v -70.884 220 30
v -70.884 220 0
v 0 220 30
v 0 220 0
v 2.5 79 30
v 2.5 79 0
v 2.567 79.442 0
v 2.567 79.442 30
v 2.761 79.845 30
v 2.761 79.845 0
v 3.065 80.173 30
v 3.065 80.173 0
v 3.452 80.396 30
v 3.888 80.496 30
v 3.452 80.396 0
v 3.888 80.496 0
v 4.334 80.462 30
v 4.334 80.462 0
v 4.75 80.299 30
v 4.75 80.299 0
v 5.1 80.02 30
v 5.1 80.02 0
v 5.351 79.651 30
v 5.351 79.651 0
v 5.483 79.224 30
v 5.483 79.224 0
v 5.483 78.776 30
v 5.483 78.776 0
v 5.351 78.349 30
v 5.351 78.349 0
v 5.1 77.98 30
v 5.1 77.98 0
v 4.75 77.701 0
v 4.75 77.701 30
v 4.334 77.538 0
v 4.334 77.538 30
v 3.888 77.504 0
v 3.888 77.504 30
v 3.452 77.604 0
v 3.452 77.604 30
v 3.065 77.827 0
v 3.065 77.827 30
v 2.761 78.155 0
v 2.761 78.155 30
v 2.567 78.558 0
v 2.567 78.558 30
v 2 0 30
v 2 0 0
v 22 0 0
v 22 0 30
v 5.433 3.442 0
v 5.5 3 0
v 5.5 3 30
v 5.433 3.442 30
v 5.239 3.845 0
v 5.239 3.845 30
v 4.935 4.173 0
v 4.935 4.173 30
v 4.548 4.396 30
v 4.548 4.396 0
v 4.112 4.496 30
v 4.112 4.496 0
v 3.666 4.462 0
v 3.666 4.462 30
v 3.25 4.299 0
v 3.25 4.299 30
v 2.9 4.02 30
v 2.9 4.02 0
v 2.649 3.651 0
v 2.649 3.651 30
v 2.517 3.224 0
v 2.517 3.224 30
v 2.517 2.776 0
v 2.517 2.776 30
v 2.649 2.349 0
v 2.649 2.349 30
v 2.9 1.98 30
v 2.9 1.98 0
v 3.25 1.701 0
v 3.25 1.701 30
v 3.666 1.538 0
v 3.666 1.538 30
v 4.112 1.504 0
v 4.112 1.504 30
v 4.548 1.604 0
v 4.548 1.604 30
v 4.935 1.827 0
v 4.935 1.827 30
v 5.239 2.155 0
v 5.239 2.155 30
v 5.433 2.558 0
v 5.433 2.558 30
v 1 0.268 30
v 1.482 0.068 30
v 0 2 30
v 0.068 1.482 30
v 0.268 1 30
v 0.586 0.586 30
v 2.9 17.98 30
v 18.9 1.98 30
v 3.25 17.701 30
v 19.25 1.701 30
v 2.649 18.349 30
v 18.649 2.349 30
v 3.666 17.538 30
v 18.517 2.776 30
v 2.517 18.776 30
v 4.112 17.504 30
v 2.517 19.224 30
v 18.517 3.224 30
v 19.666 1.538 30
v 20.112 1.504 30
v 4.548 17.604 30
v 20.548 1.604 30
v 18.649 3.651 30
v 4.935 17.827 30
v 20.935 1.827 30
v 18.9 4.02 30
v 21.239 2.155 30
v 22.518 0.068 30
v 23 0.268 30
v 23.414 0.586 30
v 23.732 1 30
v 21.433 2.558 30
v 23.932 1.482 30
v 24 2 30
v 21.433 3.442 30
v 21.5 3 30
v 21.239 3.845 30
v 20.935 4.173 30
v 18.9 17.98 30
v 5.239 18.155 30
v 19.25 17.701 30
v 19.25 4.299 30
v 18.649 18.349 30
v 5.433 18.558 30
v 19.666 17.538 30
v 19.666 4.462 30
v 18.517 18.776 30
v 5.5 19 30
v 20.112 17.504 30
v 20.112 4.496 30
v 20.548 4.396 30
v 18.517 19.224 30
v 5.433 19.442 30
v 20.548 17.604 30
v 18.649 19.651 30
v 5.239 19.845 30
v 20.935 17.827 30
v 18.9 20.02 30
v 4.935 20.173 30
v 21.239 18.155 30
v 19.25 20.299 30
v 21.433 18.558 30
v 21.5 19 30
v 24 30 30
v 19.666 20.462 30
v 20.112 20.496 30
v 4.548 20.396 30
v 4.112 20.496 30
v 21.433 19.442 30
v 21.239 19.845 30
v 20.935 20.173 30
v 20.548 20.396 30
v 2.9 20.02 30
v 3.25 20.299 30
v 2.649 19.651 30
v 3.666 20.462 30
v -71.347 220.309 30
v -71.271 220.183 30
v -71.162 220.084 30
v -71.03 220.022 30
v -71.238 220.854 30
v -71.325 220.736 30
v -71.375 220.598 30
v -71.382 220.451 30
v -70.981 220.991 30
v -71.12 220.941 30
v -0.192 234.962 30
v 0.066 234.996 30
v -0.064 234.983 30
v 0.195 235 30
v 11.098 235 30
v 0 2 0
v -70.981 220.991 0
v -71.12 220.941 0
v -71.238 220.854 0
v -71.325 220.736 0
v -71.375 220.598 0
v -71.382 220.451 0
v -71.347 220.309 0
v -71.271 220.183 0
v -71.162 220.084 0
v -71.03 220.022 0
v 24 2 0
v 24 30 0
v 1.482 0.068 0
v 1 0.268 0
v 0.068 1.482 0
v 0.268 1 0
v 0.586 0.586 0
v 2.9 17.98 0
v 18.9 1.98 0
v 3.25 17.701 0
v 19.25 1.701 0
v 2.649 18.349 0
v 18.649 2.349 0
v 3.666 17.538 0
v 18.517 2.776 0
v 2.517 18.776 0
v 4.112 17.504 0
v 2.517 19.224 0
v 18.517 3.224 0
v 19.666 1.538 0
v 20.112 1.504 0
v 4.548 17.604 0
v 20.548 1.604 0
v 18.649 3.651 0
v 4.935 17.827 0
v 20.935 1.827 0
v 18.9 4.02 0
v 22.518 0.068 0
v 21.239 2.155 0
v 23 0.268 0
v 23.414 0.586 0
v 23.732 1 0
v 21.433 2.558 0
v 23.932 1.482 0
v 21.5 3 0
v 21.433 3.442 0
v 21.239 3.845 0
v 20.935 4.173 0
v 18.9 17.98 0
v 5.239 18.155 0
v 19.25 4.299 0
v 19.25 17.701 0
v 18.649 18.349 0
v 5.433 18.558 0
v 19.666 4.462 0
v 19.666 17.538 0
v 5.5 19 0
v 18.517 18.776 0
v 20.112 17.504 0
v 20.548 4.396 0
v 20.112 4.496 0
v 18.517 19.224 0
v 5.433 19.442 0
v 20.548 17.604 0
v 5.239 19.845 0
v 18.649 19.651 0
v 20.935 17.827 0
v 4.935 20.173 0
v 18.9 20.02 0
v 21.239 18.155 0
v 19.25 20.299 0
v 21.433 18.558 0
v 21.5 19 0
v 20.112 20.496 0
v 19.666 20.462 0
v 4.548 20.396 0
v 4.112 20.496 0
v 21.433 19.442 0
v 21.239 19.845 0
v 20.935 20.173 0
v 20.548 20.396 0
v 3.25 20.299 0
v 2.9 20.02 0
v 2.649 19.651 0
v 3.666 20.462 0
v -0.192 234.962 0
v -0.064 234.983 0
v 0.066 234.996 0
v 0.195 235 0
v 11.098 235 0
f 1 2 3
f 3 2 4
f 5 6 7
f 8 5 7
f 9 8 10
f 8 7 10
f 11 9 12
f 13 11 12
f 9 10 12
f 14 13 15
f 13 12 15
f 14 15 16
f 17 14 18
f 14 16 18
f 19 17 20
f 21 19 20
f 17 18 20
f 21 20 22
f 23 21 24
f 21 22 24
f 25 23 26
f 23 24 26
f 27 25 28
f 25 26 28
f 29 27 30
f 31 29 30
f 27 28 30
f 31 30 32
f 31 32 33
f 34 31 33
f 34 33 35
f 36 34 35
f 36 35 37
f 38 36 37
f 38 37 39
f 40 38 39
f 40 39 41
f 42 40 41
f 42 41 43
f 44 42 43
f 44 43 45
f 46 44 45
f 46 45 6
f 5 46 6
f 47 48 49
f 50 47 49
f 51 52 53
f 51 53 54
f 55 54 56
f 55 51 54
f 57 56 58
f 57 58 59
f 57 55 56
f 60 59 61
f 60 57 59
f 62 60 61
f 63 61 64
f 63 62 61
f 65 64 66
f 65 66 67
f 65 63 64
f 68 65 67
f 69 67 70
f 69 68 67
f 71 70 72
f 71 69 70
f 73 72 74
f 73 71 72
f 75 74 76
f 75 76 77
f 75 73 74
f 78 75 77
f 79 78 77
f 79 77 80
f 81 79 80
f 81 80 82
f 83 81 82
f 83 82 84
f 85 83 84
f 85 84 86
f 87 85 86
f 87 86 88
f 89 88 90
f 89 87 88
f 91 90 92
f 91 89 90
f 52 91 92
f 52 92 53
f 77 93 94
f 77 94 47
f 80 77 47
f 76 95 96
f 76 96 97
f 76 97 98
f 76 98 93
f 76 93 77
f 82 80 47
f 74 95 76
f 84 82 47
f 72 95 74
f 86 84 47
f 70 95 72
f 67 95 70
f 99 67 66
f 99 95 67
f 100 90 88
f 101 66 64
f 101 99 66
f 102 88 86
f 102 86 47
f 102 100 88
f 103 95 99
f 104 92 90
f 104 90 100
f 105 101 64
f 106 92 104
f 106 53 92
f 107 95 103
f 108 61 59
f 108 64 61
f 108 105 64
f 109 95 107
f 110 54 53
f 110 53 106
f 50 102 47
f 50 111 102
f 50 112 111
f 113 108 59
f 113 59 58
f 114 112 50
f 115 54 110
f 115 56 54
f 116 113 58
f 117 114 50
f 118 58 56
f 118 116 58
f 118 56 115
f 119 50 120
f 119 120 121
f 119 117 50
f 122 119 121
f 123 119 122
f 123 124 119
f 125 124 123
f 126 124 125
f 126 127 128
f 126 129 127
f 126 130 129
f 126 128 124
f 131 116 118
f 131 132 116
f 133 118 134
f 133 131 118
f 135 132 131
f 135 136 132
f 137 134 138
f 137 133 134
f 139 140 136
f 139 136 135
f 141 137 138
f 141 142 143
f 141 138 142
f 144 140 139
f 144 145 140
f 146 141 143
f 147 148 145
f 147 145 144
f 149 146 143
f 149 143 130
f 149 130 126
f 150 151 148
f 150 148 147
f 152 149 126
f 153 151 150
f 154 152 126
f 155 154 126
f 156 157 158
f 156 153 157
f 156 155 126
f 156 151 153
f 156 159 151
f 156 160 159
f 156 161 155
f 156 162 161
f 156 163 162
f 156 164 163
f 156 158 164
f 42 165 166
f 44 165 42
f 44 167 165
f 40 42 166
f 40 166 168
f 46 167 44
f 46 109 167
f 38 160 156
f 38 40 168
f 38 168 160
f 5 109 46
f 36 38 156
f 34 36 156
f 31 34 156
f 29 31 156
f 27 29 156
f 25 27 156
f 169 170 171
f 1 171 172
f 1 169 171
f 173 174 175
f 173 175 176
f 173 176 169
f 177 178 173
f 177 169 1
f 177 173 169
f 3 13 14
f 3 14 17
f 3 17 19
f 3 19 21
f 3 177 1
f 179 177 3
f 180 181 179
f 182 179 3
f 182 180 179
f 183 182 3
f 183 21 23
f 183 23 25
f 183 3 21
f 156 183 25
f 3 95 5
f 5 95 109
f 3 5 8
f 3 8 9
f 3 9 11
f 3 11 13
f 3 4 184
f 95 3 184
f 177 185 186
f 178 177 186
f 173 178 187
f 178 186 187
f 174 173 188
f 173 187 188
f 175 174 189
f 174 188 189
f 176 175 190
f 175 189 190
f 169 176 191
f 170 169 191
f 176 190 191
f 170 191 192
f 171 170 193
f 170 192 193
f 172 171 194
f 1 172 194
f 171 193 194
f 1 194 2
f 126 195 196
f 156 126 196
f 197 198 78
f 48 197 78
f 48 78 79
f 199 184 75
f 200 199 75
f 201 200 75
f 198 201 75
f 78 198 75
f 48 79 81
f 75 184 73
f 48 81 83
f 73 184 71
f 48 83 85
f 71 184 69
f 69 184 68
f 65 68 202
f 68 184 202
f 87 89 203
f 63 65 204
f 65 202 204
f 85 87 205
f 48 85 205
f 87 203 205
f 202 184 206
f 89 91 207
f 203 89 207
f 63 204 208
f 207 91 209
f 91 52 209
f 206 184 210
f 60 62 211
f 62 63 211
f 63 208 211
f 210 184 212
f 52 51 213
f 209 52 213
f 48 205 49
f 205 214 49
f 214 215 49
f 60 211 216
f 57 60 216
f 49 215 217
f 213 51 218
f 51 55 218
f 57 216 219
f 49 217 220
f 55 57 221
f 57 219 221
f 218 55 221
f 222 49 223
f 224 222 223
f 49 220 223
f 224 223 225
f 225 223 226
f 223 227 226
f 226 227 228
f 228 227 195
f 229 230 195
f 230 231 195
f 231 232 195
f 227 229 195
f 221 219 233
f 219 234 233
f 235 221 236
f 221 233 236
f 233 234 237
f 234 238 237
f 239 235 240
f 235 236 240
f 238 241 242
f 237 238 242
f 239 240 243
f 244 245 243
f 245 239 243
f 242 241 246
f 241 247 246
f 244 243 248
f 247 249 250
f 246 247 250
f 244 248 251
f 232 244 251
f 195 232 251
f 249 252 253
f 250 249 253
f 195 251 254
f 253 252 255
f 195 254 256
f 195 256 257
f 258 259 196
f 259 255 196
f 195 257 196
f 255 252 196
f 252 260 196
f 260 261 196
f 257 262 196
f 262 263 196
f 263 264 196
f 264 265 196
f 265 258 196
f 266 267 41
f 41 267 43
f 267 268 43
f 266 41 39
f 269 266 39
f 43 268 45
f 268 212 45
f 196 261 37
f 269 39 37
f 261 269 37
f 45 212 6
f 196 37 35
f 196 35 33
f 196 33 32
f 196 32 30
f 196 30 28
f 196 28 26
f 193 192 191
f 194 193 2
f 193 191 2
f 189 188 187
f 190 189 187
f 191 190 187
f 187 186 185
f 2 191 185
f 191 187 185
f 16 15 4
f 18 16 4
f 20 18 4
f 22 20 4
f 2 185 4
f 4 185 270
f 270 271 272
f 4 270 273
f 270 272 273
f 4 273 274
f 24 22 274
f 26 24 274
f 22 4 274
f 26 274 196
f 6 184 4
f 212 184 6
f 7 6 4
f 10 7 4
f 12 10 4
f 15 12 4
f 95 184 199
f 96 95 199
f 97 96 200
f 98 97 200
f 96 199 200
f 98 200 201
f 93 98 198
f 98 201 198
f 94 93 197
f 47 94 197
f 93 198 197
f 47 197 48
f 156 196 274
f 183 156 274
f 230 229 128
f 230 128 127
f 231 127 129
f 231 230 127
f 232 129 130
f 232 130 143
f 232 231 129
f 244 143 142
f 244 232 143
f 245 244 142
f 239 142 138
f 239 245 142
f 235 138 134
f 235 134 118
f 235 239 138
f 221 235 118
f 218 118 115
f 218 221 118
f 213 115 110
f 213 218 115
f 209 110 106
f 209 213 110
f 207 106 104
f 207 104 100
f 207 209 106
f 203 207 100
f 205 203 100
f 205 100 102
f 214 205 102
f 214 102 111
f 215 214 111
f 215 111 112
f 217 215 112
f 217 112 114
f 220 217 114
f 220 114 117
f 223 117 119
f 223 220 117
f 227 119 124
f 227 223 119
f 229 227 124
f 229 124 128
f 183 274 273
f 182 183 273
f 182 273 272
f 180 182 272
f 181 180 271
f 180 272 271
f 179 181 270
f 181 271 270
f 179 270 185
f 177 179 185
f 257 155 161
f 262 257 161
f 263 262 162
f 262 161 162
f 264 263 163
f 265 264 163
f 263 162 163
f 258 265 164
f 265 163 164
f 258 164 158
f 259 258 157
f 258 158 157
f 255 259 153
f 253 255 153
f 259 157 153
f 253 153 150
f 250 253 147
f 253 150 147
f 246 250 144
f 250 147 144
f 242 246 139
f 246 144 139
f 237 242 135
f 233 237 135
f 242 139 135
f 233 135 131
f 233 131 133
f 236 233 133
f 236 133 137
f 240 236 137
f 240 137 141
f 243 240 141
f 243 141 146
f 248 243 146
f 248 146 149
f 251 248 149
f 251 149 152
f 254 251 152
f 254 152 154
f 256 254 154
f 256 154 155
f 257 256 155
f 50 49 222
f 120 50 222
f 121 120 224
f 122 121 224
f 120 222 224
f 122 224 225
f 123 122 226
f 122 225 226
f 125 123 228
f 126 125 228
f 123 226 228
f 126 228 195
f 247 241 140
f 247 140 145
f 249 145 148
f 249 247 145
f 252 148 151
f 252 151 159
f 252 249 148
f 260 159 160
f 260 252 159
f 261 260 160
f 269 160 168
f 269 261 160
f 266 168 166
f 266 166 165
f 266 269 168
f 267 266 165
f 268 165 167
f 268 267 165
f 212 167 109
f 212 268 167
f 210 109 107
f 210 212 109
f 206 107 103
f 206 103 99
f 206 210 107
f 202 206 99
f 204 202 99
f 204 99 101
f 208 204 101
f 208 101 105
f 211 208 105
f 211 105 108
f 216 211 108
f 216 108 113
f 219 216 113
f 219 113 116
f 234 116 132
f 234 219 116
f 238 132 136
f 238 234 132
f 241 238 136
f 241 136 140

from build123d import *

# Parameters (mm, degrees)
SKETCH_1_R          = 1.5
EXTRUDE_1_DEPTH     = 30
SKETCH_2_R          = 1.5
CUT_EXTRUDE_1_DEPTH = 248.428255263
CUT_EXTRUDE_2_DEPTH = 248.428255263
SKETCH_4_R          = 1.5
CUT_EXTRUDE_3_DEPTH = 248.428255263


with BuildPart() as part:
    # 草图1 → 凸台-拉伸1 (new body)
    with BuildSketch(Plane.XY):
        with BuildLine():
            Line((2, 0), (22, 0))
            ThreePointArc((22, 0), (23.414213562, 0.585786438), (24, 2))
            Line((24, 2), (24, 220))
            Line((24, 220), (24, 233))
            ThreePointArc((24, 233), (23.414213562, 234.414213562), (22, 235))
            Line((22, 235), (0.195482884, 235))
            ThreePointArc((0.195482884, 235), (0.000927124, 234.990514521), (-0.19178318, 234.962148057))
            Line((-0.19178318, 234.962148057), (-70.981279128, 220.990537014))
            ThreePointArc((-70.981279128, 220.990537014), (-71.382091243, 220.45136106), (-70.884462612, 220))
            Line((-70.884462612, 220), (0, 220))
            Line((0, 220), (0, 2))
            ThreePointArc((0, 2), (0.585786438, 0.585786438), (2, 0))
        make_face()
        with Locations((20, 3)):
            Circle(SKETCH_1_R, mode=Mode.SUBTRACT)
        with Locations((4, 3)):
            Circle(SKETCH_1_R, mode=Mode.SUBTRACT)
        with Locations((4, 19)):
            Circle(SKETCH_1_R, mode=Mode.SUBTRACT)
    extrude(amount=EXTRUDE_1_DEPTH)

    # 草图2 → 切除-拉伸1 (cut, through all)
    with BuildSketch(Plane.XY.offset(30)):
        with Locations((20, 19)):
            Circle(SKETCH_2_R)
    extrude(amount=-CUT_EXTRUDE_1_DEPTH, mode=Mode.SUBTRACT)

    # 草图3 → 切除-拉伸2 (cut, through all)
    with BuildSketch(Plane(origin=(0, 0, 0), x_dir=(-1, 0, 0), z_dir=(0, 0, -1))):
        Polygon((-24, 30), (-11.097741442, 235), (-26.866932521, 235), align=None)
    extrude(amount=-CUT_EXTRUDE_2_DEPTH, mode=Mode.SUBTRACT)

    # 草图4 → 切除-拉伸3 (cut, through all)
    with BuildSketch(Plane(origin=(0, 0, 0), x_dir=(-1, 0, 0), z_dir=(0, 0, -1))):
        with Locations((-4, 79)):
            Circle(SKETCH_4_R)
    extrude(amount=-CUT_EXTRUDE_3_DEPTH, mode=Mode.SUBTRACT)


solid = part.part
